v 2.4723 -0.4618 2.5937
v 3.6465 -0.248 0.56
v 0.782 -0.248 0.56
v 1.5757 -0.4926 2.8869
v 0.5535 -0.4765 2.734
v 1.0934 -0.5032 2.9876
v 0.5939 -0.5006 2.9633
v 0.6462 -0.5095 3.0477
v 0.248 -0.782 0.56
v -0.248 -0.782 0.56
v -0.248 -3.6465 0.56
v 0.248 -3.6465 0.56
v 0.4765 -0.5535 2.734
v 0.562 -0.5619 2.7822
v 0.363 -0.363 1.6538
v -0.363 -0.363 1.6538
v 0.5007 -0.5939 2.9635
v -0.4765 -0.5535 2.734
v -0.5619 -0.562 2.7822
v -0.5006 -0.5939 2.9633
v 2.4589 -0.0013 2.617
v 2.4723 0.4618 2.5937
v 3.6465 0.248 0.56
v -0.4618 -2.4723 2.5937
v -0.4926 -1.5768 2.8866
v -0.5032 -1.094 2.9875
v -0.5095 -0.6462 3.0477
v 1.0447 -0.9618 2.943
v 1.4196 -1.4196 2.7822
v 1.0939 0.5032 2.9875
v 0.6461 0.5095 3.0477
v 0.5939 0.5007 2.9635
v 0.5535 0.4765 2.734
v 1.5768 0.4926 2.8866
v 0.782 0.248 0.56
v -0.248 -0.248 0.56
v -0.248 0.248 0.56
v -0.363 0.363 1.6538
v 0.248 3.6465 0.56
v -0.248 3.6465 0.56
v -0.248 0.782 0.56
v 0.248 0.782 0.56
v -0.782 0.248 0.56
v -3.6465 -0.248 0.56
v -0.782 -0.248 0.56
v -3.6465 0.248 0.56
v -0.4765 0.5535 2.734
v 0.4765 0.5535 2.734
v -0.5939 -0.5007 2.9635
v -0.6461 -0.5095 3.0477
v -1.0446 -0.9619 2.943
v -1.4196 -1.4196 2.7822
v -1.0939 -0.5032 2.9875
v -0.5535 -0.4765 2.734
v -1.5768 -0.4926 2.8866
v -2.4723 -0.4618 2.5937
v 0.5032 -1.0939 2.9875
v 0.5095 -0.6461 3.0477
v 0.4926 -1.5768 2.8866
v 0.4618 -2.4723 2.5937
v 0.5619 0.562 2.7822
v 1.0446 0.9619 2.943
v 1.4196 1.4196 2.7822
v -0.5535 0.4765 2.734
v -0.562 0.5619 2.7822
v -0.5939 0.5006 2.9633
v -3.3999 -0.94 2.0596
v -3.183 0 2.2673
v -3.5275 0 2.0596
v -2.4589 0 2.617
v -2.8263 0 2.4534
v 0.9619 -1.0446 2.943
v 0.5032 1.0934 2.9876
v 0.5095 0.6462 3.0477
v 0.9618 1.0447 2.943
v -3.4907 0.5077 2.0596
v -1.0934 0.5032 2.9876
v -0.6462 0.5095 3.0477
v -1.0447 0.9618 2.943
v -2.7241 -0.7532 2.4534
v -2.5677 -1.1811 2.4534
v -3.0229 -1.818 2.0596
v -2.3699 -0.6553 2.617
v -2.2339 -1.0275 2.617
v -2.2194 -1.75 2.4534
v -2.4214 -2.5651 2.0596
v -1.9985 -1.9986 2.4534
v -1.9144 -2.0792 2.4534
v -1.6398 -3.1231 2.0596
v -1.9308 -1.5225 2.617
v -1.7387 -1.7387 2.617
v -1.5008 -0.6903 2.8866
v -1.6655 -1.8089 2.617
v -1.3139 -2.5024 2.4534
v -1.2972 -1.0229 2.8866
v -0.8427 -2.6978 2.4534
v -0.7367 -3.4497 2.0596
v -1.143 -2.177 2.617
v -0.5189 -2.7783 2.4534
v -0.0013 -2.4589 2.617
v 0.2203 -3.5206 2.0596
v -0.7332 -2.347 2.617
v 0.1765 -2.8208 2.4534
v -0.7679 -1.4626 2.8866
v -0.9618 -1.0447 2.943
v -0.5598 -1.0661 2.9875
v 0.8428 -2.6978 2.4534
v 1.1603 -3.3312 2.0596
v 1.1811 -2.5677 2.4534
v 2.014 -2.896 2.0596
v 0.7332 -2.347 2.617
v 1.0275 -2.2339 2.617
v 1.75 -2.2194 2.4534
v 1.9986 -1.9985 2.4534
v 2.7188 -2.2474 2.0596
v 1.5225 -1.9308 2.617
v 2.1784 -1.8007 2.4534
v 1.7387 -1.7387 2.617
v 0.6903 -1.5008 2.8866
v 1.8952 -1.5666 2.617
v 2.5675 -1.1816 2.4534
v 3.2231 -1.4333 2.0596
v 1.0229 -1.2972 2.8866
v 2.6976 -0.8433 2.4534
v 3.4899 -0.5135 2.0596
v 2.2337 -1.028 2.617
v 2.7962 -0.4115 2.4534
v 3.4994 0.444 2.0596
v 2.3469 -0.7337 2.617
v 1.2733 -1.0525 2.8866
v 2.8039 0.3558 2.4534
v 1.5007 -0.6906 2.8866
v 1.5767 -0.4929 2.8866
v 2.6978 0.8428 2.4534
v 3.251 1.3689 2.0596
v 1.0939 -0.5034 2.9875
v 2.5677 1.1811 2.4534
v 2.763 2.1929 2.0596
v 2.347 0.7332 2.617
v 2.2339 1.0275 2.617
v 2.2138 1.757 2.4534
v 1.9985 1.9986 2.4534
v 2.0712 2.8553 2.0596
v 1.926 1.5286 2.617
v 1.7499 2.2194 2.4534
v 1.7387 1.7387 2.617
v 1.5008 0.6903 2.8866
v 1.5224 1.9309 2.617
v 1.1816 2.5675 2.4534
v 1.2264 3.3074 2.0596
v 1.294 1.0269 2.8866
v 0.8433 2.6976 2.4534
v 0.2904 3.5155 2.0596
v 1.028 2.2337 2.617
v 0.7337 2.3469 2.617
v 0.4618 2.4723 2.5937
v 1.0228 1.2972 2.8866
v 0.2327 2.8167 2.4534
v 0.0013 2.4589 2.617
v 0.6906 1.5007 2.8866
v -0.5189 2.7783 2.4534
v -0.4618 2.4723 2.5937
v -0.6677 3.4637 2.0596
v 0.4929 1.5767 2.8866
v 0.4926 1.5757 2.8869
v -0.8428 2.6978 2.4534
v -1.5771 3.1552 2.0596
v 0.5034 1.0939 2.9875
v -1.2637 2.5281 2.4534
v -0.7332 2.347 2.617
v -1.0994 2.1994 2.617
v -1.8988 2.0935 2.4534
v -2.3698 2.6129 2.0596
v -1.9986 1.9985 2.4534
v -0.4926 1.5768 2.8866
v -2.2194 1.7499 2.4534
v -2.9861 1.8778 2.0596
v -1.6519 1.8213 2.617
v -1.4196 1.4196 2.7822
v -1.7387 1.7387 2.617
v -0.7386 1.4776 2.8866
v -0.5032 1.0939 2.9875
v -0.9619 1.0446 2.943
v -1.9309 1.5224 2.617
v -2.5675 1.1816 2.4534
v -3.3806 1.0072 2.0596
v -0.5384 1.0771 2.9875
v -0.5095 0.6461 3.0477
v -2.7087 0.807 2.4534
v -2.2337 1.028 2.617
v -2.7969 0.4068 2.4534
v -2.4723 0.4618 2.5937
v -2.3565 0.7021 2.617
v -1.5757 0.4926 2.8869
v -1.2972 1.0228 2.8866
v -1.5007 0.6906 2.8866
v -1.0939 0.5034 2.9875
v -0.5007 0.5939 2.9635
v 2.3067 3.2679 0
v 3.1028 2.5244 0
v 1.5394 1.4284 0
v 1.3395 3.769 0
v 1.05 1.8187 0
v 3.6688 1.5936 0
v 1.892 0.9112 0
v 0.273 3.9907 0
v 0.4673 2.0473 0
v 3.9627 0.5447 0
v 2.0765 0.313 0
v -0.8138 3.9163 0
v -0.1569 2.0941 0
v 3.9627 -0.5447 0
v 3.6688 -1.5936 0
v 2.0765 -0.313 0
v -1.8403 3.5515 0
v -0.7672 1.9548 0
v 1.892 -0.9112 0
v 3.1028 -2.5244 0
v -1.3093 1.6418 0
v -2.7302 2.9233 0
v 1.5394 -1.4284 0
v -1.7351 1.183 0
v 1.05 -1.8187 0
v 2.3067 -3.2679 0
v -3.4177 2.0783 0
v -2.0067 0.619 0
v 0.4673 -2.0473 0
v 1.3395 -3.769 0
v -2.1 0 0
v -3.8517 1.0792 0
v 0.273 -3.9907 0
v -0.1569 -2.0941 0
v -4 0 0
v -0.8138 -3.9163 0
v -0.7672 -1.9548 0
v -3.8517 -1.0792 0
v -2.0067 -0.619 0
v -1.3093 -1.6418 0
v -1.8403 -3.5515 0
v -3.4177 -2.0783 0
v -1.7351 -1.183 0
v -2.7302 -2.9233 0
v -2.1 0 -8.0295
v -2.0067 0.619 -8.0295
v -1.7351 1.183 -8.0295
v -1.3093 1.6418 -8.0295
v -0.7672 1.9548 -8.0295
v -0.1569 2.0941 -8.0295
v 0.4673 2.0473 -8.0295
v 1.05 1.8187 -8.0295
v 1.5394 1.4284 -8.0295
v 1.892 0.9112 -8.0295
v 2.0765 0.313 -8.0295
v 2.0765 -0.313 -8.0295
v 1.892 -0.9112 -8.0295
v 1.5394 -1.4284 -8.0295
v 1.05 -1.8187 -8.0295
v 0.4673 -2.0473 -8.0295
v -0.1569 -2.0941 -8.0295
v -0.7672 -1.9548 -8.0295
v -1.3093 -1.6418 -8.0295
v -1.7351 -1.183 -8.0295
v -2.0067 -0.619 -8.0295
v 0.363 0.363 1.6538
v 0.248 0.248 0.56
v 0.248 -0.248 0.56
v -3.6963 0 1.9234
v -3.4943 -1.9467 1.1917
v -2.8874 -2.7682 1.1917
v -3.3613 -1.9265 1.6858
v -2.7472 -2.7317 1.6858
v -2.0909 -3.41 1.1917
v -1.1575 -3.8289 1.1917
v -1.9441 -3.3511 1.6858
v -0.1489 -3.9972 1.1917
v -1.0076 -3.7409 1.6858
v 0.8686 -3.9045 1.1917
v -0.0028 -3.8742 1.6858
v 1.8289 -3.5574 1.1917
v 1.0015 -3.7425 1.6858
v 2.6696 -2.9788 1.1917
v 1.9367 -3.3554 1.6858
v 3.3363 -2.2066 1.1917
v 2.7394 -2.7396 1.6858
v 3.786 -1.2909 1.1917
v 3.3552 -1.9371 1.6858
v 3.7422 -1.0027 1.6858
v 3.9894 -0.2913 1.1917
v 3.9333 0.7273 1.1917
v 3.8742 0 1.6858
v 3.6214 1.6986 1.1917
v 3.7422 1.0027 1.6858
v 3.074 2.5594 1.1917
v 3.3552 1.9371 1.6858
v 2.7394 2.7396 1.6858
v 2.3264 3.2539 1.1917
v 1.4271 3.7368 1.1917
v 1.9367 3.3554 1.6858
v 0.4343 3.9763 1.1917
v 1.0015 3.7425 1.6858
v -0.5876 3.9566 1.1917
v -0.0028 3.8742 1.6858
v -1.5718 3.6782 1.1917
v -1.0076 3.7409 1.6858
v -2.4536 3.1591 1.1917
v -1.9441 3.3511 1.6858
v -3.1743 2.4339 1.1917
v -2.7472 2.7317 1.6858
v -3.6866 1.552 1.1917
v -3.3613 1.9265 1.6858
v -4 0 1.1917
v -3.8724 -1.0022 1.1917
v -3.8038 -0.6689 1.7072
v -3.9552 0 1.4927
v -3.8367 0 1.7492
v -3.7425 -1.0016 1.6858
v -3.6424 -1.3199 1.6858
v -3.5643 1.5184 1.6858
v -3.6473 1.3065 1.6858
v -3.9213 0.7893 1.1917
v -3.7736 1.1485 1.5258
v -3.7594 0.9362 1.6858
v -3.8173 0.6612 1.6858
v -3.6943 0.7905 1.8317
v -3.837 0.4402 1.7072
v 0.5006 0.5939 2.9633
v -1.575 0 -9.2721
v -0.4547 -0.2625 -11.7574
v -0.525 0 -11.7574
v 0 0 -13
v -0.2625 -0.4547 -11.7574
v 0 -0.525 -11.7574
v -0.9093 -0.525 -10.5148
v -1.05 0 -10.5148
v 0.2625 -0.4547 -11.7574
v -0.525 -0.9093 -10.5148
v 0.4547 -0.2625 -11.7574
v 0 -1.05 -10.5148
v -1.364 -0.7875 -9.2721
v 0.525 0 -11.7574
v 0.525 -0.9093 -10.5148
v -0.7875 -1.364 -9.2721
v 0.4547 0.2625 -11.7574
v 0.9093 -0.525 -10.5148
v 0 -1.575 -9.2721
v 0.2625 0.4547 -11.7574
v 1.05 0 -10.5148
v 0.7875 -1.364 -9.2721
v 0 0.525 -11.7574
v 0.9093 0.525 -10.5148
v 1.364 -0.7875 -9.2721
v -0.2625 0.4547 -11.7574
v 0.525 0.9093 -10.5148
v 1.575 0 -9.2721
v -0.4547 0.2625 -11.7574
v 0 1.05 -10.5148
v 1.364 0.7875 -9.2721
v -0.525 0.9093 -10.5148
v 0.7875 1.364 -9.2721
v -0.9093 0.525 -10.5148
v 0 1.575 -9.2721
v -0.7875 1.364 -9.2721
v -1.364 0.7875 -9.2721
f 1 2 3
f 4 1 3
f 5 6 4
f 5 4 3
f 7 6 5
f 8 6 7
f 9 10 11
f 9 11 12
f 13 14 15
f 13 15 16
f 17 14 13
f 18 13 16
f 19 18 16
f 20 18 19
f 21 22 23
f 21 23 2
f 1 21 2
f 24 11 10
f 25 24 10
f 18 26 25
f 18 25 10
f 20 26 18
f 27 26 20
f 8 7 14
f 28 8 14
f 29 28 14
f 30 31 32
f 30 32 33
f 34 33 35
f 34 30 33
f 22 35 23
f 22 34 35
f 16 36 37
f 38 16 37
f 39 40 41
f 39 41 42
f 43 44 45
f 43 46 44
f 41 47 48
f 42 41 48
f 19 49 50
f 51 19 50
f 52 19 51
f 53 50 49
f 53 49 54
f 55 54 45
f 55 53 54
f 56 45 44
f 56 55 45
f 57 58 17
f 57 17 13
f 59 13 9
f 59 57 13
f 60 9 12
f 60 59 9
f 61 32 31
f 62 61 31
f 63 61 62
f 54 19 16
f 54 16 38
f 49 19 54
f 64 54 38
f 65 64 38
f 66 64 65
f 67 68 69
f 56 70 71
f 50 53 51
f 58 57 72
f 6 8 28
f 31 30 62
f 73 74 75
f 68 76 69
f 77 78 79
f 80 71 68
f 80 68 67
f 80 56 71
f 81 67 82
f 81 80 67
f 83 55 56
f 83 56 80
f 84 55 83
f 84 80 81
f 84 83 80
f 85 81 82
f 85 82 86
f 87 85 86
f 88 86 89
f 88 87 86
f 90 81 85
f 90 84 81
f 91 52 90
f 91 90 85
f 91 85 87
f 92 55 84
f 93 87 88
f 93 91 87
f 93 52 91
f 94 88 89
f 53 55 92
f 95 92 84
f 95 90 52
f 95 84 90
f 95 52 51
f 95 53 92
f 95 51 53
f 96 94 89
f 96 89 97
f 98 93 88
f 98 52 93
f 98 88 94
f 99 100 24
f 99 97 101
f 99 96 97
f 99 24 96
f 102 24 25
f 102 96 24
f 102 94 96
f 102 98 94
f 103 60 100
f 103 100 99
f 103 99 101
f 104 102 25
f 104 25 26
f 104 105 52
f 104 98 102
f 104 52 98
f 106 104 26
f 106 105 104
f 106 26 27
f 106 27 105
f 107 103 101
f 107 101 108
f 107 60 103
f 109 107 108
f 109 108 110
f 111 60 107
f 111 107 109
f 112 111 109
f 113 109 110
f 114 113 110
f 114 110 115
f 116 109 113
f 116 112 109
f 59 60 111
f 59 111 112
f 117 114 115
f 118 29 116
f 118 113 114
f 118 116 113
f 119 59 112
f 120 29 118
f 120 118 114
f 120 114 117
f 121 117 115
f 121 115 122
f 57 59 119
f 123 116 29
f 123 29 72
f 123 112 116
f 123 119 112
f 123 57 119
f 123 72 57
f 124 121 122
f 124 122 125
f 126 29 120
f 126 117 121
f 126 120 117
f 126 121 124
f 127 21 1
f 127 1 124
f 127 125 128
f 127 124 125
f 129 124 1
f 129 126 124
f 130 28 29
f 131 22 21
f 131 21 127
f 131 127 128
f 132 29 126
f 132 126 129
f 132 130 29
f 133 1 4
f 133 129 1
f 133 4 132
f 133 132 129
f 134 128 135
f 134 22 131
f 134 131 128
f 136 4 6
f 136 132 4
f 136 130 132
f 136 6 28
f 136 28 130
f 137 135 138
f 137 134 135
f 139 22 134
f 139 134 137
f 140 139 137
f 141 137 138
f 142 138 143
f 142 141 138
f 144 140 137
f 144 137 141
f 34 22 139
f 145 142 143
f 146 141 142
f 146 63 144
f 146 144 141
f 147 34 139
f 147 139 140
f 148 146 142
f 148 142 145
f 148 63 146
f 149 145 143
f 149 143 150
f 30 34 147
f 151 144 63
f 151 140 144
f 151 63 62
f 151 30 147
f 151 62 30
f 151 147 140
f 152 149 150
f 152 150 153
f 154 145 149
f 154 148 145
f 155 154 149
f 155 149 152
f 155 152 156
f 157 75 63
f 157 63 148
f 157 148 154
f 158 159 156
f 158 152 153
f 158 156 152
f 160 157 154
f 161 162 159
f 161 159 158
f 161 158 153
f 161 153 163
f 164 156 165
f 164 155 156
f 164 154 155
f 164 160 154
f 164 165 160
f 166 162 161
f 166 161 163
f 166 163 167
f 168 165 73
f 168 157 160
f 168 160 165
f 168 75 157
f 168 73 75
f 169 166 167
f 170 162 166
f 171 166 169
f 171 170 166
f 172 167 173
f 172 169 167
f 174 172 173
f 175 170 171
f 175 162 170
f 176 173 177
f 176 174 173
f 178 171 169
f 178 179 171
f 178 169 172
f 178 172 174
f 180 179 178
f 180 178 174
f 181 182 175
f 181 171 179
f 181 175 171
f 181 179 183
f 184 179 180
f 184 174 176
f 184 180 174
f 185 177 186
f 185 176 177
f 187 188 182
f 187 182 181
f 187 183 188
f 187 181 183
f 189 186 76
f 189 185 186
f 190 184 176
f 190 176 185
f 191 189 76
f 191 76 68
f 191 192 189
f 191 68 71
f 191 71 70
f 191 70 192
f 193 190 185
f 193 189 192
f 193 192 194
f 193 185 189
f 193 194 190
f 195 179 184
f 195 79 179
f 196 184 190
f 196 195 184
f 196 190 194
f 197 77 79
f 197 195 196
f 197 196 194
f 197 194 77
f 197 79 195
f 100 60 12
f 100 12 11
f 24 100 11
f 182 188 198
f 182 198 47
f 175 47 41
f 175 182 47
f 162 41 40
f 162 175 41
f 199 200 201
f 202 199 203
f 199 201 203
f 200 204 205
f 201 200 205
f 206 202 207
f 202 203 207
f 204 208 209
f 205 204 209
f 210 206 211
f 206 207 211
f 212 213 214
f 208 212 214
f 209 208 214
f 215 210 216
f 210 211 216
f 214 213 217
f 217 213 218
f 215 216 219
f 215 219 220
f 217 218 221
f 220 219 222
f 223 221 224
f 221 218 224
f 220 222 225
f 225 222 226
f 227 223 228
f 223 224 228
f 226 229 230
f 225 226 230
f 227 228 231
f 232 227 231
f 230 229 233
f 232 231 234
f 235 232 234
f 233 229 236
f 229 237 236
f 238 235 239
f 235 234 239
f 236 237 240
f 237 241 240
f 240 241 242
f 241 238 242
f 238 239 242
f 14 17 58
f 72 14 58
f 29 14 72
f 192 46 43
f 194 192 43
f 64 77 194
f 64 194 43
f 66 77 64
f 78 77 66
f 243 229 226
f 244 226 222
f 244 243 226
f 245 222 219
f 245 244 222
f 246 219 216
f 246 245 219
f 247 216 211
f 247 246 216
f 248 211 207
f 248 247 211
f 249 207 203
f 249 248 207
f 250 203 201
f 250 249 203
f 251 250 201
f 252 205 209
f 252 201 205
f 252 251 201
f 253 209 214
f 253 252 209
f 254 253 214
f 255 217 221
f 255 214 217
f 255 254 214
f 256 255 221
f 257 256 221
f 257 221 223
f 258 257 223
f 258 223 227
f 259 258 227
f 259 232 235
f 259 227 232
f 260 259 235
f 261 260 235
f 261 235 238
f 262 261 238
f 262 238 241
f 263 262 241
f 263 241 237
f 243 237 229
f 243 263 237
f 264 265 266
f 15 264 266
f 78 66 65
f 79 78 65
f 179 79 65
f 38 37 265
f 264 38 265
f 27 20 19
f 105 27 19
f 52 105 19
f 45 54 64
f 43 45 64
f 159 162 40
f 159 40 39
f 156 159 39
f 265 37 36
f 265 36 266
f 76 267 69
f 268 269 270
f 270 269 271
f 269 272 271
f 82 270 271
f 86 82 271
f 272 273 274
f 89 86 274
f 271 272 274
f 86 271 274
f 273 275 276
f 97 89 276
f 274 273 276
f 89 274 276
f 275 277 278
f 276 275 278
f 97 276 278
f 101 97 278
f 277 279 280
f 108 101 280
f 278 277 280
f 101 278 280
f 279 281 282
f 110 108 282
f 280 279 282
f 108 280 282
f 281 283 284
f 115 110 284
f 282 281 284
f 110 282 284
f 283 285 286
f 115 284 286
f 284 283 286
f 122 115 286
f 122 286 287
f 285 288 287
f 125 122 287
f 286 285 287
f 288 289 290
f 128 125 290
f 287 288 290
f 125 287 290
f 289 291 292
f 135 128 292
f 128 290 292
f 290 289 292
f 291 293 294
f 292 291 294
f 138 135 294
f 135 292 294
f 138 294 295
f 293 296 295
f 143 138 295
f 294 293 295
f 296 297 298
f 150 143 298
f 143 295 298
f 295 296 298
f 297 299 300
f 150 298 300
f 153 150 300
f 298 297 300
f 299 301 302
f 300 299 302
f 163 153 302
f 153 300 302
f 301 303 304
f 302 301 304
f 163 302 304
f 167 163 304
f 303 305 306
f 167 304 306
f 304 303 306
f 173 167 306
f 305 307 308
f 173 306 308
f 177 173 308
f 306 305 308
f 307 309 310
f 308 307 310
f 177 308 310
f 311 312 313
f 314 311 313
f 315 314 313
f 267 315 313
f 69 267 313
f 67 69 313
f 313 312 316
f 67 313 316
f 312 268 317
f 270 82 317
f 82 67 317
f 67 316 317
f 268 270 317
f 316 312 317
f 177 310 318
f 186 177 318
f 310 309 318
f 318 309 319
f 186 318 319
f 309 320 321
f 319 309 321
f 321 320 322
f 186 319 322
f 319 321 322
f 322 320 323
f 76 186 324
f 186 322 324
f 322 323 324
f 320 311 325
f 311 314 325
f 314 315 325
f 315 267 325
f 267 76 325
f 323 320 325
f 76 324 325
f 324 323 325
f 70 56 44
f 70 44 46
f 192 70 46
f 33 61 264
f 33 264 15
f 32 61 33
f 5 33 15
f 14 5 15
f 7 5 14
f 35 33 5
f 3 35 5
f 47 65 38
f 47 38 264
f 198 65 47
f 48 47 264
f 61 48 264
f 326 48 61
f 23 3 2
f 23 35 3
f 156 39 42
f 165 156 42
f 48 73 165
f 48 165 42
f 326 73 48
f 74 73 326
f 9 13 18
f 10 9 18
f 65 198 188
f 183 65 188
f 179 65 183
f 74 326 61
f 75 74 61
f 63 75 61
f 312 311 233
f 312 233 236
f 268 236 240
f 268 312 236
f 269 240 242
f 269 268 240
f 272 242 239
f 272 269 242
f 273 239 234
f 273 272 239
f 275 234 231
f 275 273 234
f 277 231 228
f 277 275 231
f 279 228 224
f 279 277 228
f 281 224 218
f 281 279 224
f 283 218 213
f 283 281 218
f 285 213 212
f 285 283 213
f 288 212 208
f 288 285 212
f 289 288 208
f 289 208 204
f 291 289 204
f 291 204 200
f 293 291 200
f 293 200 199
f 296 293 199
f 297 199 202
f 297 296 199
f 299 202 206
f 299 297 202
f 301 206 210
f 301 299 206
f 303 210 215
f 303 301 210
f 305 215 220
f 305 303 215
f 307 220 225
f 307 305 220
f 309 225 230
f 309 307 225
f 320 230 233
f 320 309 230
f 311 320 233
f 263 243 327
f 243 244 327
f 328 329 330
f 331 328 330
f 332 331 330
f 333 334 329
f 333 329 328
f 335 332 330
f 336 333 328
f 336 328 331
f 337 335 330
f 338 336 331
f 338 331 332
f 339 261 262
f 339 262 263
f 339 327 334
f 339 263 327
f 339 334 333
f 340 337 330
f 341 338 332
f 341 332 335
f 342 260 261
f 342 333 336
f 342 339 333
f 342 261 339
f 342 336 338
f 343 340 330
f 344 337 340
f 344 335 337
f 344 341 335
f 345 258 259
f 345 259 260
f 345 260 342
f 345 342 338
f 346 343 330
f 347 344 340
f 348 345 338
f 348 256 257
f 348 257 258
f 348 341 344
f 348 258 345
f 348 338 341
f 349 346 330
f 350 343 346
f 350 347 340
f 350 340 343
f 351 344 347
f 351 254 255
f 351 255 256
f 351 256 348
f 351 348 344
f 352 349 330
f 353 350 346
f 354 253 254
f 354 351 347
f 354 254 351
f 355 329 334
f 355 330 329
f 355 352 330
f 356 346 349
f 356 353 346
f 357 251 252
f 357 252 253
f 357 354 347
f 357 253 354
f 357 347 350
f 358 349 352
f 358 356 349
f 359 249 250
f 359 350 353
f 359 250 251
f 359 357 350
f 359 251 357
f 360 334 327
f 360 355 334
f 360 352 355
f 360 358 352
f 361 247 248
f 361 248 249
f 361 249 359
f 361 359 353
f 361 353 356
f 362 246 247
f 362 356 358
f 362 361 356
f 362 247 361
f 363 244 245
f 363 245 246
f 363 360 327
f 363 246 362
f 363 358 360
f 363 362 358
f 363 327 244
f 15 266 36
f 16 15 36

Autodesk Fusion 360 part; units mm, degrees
sketch "Sketch1" plane through (0, 0, 0) normal (0, 1, 0) x (1, 0, 0)
  line L0 (-2.1, 0) -> (-2.1, 13)
  line L1 (-2.1, 13) -> (0, 13)
  line L2 (0, 13) -> (0, -3.1)
  line L3 (-2.1, 0) -> (-4, 0)
  line L4 (-4, 0) -> (-4, -1.7235)
  arc A0 (-4, -1.7235) -> (0, -3.1) centre (0, 3.4) ccw
  dimension "d9" = 4.2
  dimension "d74" = 13
  dimension "d75" = 8
  dimension "d78" = 3.1
  dimension "d118" = 6.5
revolve "Revolve1" add sketch "Sketch1" angle 360 about axis through (0, 0, -13) along (0, 0, 1) makes body 1
ref_plane "WorkPlane1" through (0, 0, 3.1) normal (0, 0, 1) x (1, 0, 0)
sketch "Sketch7" plane through (0, 0, 3.1) normal (0, 0, 1) x (1, 0, 0)
  line L0 (-0.618, 0.618) -> (0.618, 0.618)
  line L1 (0.618, 0.618) -> (0.618, -0.618)
  line L2 (0.618, -0.618) -> (-0.618, -0.618)
  line L3 (-0.618, -0.618) -> (-0.618, 0.618)
  point P0 (-0.618, 0)
  point P1 (0, 0.618)
  dimension "d65" = 1.236
  dimension "d119" = 1.236
extrude "Extrude4" add sketch "Sketch7" against normal blind 2.032 draft -10 separate body makes body 2
sketch "Sketch10" plane through (0, 0, 3.1) normal (0, 0, 1) x (1, 0, 0)
  line L0 (-2.18, 0) -> (2.18, 0) construction
  line L1 (-2.18, 0.515) -> (2.18, 0.515)
  line L2 (2.18, 0.515) -> (2.18, -0.515)
  line L3 (2.18, -0.515) -> (-2.18, -0.515)
  line L4 (-2.18, -0.515) -> (-2.18, 0.515)
  line L5 (0.515, -2.18) -> (-0.515, -2.18)
  line L6 (-0.515, -2.18) -> (-0.515, 2.18)
  line L7 (0.515, 2.18) -> (0.515, -2.18)
  line L8 (-0.515, 2.18) -> (0.515, 2.18)
  dimension "d90" = 4.36
  dimension "d91" = 1.03
  dimension "d114" = 90
extrude "Extrude1" add sketch "Sketch10" against normal blind 2.54 draft -6 separate body makes body 3 at (-0.426, -1.536, 2.2533)
draft "Draft2" angle 30 neutral plane through (0, 0, 3.1) pull (0, 0, 1) 4 faces at (0.0827, 2.091, 2.2533) (2.091, -0.0827, 2.2533) (-2.091, 0.0827, 2.2533) (-0.0827, -2.091, 2.2533) on bodies 3
combine "Combine1" operation cut target body 1 tool bodies 2 3
ref_plane "WorkPlane2" through (-0.4816, 1.9491, 2.7822) normal (0, 0, -1) x (-1, 0, 0)
sketch "Sketch8" plane through (-0.2873, 1.3933, 2.7822) normal (0, 0, -1) x (1, 0, 0)
  line L0 (0.2873, 1.3933) -> (1.983, 3.089)
  line L1 (2.0373, 1.3933) -> (22.7873, 1.3933)
  point P0 (0.2873, 1.3933)
  dimension "d83" = 2.398
  dimension "d112" = 45
ref_plane "WorkPlane3" through (0.8478, -0.8478, 2.7822) normal (-0.6645, -0.6645, 0.342) x (0.7071, -0.7071, 0)
sketch "Sketch9" plane through (0.4897, -0.7159, 2.3426) normal (-0.6645, -0.6645, 0.342) x (0.7071, -0.7071, 0)
  line L0 (-0.8525, 0.4678) -> (1.5455, 0.4678)
  line L1 (1.5455, 0.4678) -> (1.5455, 2.5278)
  line L2 (1.5455, 2.5278) -> (-0.8525, 2.5278)
  line L3 (-0.8525, 2.5278) -> (-0.8525, 0.4678)
  point P0 (-0.8525, 0.4678)
  point P1 (1.5455, 0.4678)
  dimension "d85" = 2.06
extrude "Extrude6" cut sketch "Sketch9" along normal blind 0.515 draft -50 bodies 1
pattern_circular "C-Pattern1" count 4 over 360 about axis through (0, 0, 1.75) along (0, 0, 1) of "Extrude6"
fillet "Fillet4" radius 1.0333 1 edges at (-3.7293, 1.4465, 1.7235) on bodies 1
thread "Thread2" thread offset 0 thread length 11.6
sketch "Sketch5" plane through (0, 0, 0) normal (0, 1, 0) x (1, 0, 0)
  line L0 (0, 13) -> (0, -3.1)
  line L1 (0, 13) -> (-2.142, 13)
  line L2 (-2.142, 13) -> (-2.142, 7.9301)
  line L3 (-2.142, 7.9301) -> (0, 13)
  dimension "d109" = 5.0699
  dimension "d111" = 2.142
revolve "Revolve2" cut sketch "Sketch5" angle 360 about axis through (0, 0, 1.75) along (0, 0, 1) bodies 1
equation "d9 = adsk_nomdia"
equation "adsk_nomlen = 13.00 mm"
equation "adsk_headh = 3.10 mm"
equation "adsk_headdia = 8.00 mm"
equation "adsk_nomdia = 4.20 mm"
equation "adsk_phildia = 4.36 mm"
equation "adsk_philwidth = 1.03 mm"
equation "adsk_phildepth = 2.54 mm"
equation "d65 = adsk_philwidth * 1.2"
equation "d68 = -adsk_phildepth * 0.8"
equation "d74 = adsk_nomlen"
equation "d75 = adsk_headdia"
equation "d78 = adsk_headh"
equation "d79 = adsk_headh"
equation "d83 = adsk_phildia / 2 * 1.1"
equation "d85 = adsk_philwidth * 2"
equation "d86 = adsk_philwidth / 2"
equation "d90 = adsk_phildia"
equation "d91 = adsk_philwidth"
equation "adsk_startlen = 5.069855 mm"
equation "adsk_thrlen = 11.60 mm"
equation "d102 = adsk_headh / 3"
equation "d104 = adsk_thrlen"
equation "d109 = adsk_startlen"
equation "d111 = adsk_nomdia * 0.51"
equation "adsk_ovalrad = 6.50 mm"
equation "d118 = adsk_ovalrad"
equation "d119 = adsk_philwidth * 1.2"
properties part number "CRPHTS ANSI B18.6.5M - 4.2 x 1.4 x 13  - AB - IA Steel Grade 2 Plain"
